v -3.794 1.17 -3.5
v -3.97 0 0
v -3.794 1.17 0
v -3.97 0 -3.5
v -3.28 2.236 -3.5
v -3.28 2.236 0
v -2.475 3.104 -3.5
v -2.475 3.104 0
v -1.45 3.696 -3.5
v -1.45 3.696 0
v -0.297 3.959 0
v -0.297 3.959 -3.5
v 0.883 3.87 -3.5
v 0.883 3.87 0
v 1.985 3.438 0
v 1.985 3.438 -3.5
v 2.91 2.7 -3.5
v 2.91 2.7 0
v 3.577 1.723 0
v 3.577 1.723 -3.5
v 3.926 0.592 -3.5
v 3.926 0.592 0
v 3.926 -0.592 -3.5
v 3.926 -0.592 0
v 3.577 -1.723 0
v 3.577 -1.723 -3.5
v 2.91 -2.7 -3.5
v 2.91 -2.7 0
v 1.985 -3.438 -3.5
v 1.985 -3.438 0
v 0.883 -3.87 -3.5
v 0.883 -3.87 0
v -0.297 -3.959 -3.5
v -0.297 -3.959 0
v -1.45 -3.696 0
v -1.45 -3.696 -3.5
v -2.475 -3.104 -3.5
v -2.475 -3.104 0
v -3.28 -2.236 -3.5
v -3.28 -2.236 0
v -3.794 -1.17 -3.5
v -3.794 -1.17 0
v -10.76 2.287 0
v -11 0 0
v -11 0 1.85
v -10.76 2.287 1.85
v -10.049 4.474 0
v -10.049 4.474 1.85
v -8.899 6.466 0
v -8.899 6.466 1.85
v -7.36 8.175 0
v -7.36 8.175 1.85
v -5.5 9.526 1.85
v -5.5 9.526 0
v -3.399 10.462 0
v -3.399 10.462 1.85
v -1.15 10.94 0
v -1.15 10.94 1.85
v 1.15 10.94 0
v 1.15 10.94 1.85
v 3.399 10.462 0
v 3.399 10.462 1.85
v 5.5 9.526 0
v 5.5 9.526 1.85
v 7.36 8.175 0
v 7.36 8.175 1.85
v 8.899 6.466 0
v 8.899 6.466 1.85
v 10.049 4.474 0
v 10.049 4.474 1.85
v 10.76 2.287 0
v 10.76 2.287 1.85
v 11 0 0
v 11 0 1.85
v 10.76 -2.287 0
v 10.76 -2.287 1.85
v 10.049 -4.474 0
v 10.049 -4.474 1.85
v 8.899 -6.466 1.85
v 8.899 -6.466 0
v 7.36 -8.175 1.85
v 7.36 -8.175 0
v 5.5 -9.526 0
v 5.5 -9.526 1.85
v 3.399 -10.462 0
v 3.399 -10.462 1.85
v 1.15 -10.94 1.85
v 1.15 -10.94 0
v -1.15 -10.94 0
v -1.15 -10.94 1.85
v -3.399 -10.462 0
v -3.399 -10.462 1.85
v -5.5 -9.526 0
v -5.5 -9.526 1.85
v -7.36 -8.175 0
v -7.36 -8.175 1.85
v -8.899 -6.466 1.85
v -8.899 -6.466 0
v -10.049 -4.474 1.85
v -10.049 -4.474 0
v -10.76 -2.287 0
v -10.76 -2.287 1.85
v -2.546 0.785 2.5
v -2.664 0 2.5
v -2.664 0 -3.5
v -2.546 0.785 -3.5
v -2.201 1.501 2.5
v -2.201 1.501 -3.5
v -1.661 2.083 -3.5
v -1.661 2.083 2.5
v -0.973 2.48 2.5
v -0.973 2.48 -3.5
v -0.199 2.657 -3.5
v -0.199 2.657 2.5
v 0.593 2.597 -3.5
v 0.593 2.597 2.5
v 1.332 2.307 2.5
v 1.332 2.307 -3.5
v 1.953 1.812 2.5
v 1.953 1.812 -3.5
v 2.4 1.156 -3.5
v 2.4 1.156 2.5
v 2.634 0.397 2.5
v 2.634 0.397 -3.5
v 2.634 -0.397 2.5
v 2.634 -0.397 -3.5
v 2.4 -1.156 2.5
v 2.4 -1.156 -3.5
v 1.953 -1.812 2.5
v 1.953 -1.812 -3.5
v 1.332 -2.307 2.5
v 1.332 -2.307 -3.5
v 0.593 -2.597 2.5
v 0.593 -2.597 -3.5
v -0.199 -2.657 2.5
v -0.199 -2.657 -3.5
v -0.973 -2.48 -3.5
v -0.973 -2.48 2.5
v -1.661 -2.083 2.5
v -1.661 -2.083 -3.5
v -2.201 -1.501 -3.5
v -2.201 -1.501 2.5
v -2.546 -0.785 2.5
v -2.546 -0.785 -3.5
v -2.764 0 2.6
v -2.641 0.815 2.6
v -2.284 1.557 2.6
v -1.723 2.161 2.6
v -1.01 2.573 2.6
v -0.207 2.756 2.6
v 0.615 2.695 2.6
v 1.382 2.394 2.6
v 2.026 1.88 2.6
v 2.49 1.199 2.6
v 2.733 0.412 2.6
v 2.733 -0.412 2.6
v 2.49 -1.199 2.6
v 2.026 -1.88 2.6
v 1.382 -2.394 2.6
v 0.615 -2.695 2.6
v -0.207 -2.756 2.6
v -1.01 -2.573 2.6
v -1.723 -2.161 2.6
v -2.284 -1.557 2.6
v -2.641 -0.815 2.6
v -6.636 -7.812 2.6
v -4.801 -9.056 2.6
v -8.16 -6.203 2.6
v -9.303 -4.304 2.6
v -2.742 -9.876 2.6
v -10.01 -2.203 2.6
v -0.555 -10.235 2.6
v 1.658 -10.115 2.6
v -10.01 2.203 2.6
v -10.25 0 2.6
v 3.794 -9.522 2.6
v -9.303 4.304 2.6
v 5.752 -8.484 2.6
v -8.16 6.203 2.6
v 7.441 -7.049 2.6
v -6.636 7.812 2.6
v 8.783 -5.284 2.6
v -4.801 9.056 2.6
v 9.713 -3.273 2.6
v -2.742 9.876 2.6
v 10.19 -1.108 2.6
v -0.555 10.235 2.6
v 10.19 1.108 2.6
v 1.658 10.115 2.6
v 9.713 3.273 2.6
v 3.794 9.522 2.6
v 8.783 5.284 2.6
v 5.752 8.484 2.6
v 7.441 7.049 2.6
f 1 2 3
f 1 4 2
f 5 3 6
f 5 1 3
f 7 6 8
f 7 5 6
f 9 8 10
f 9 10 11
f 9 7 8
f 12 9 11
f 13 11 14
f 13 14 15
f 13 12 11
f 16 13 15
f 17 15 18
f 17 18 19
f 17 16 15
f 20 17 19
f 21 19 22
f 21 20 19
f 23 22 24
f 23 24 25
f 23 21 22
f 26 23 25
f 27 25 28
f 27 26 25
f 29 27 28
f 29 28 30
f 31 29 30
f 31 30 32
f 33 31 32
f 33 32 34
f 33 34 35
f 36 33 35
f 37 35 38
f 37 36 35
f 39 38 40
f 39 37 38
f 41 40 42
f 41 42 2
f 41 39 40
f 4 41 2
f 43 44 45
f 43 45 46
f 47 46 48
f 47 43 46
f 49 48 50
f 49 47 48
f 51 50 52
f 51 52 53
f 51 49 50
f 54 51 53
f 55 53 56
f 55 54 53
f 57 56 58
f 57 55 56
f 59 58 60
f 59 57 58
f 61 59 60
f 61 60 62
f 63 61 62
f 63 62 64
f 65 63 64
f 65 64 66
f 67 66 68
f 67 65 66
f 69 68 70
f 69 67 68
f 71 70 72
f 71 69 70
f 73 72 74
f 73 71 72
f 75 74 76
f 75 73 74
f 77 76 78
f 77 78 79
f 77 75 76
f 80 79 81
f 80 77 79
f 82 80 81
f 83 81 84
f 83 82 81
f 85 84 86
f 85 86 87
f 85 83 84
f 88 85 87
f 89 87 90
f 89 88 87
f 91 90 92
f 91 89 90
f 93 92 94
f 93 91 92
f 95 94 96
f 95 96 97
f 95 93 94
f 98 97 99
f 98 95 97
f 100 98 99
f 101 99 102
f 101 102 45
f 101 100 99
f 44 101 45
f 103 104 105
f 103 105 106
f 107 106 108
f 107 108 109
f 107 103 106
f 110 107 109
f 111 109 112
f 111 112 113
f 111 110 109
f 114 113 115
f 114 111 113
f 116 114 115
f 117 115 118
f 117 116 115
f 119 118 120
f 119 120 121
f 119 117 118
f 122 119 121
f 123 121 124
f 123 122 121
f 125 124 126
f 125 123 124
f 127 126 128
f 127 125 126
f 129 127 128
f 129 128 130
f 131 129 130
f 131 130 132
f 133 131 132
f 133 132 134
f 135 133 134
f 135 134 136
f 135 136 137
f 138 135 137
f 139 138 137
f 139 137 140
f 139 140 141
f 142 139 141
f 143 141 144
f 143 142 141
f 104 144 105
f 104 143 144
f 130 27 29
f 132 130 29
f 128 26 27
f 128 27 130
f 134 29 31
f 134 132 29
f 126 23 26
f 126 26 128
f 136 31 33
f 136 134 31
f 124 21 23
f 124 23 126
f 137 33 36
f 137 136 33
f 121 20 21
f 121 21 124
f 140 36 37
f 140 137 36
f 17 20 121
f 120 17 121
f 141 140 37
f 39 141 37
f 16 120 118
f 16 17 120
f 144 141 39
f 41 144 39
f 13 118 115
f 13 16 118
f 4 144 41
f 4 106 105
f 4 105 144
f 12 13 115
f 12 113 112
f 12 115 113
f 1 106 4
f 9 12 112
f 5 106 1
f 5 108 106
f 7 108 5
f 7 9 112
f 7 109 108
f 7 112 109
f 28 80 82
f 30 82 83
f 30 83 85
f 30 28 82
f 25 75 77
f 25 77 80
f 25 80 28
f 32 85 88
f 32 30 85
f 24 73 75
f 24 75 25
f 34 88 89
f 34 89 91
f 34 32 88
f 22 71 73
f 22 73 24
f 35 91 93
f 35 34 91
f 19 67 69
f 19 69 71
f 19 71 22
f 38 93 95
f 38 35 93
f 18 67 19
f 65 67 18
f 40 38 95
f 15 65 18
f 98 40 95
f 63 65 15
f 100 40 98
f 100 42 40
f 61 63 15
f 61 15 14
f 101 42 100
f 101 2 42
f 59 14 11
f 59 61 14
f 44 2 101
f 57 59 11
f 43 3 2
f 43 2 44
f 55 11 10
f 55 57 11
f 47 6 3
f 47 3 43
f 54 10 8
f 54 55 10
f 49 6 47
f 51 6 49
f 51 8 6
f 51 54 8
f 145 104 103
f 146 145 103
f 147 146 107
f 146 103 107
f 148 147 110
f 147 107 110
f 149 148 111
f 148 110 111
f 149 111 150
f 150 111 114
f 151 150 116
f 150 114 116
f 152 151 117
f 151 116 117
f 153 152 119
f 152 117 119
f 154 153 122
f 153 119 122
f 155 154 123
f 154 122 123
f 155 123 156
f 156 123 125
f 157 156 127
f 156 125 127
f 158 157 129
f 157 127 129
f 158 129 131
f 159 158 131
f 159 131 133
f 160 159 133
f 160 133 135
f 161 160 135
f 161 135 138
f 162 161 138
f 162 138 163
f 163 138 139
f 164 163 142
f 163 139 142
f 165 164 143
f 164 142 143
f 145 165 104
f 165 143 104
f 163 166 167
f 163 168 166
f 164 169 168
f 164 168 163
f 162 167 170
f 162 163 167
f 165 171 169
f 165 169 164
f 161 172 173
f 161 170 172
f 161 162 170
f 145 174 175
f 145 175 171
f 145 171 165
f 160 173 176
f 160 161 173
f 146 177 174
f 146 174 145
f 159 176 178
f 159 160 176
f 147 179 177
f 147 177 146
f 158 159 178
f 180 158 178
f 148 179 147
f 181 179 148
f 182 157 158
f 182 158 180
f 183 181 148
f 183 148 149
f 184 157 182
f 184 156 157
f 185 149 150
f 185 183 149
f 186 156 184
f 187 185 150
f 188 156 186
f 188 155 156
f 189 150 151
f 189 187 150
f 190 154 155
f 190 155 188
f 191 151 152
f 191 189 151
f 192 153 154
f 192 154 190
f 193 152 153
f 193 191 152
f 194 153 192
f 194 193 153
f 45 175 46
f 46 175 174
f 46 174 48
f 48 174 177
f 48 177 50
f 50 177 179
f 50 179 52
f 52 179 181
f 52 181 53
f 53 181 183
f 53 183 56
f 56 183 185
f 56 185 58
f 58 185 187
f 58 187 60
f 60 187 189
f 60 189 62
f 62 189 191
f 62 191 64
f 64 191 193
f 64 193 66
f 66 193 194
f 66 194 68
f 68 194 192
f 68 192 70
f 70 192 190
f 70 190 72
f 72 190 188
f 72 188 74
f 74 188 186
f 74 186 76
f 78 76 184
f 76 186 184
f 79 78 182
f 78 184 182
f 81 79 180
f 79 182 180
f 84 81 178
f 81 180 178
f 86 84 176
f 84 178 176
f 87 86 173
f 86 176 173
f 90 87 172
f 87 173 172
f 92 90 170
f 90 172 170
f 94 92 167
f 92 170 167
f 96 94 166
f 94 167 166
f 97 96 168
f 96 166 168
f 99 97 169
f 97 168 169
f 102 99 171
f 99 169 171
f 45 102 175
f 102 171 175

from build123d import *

# Parameters (mm, degrees)
F2_SIZE = 0.75
F3_SIZE = 0.1


with BuildPart() as f1:
    # F0 (on Front) → F1 (revolve)
    with BuildSketch(Plane.XZ):
        Polygon((-11, 2.6), (-11, 0), (-3.97, 0), (-3.97, -3.5), (-2.663974, -3.5), (-2.663974, 2.6), align=None)
    revolve(axis=Axis((0, 0, -0.45), (0, 0, -1)))

    # F2
    f2_edges = [f1.edges().sort_by_distance(p)[0] for p in [
        (11, 0, 2.6),
    ]]
    chamfer(f2_edges, length=F2_SIZE)

    # F3
    f3_edges = [f1.edges().sort_by_distance(p)[0] for p in [
        (2.663974, 0, 2.6),
    ]]
    chamfer(f3_edges, length=F3_SIZE)


solid = f1.part
